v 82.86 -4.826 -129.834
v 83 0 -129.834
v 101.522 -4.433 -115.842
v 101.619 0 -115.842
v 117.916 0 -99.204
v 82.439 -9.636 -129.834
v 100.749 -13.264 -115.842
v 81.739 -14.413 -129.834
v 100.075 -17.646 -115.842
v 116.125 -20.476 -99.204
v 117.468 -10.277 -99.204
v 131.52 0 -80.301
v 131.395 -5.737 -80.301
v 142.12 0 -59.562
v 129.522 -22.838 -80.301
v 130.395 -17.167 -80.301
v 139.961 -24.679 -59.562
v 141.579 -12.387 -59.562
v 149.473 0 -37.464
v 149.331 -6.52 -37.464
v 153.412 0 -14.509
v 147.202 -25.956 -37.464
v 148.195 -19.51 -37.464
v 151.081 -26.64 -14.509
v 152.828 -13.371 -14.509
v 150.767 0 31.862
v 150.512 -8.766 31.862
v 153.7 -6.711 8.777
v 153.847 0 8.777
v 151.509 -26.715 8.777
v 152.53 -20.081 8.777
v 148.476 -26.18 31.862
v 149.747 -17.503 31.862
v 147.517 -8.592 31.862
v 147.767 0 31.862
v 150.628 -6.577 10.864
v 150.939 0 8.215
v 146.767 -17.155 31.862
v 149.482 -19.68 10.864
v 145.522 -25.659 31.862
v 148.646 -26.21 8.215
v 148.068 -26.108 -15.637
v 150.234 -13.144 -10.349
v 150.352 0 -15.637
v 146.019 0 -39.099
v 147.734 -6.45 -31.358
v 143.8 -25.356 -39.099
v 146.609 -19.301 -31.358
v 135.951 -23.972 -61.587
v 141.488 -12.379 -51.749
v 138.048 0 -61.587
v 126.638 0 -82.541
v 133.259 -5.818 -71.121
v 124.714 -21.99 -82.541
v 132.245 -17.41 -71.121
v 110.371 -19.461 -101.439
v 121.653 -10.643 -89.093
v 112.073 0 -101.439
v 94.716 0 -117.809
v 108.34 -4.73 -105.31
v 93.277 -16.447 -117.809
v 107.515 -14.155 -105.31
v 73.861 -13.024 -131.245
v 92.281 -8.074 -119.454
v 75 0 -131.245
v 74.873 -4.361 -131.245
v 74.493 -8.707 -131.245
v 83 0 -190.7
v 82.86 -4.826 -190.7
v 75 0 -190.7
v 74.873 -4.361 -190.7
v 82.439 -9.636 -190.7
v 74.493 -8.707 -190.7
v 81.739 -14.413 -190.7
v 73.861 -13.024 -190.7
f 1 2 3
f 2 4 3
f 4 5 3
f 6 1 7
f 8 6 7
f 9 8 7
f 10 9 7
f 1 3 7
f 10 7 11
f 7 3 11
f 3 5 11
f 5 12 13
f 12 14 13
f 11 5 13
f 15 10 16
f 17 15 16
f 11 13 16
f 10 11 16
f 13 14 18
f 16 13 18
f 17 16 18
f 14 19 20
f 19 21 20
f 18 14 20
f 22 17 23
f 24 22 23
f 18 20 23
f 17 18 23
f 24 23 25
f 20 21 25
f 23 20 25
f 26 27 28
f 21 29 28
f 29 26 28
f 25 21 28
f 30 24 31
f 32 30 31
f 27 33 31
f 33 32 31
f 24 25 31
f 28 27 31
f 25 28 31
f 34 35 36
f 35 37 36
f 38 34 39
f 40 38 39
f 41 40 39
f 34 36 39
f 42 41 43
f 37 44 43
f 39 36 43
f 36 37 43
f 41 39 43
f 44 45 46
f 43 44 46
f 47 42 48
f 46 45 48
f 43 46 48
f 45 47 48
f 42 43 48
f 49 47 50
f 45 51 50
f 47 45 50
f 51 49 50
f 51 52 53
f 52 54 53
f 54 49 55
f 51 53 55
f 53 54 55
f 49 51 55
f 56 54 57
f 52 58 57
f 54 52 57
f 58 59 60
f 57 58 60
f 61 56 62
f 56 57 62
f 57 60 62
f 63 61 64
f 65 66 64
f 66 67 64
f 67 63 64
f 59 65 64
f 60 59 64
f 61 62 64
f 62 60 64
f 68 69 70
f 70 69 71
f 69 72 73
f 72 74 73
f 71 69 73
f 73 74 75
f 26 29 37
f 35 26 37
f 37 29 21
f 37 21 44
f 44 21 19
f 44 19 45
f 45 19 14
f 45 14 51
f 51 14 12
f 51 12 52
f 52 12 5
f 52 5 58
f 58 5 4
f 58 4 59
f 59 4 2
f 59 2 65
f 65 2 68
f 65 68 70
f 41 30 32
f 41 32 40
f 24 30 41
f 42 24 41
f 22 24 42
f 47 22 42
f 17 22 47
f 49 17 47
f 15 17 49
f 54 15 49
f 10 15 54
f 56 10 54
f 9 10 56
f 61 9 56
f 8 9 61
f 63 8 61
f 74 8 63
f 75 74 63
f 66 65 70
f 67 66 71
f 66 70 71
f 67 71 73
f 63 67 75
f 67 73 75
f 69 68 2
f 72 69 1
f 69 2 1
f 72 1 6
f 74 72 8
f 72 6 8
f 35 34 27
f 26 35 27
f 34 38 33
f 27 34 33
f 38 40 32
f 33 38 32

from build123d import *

# Parameters (mm, degrees)
REVOLVE1_ANGLE = 10


with BuildPart() as part:
    # Sketch1 → Revolve1 (revolve)
    with BuildSketch(Plane(origin=(0, 0, 0), x_dir=(1, 0, 0), z_dir=(0, 1, 0))):
        with BuildLine():
            Line((75, 190.7), (83, 190.7))
            Line((83, 190.7), (83, 129.833691726))
            ThreePointArc((83, 129.833691726), (142.120054058, 59.562385293), (150.766644537, -31.862303784))
            Line((150.766644537, -31.862303784), (147.766644537, -31.862303784))
            ThreePointArc((147.766644537, -31.862303784), (138.047901954, 61.587047389), (75, 131.244762334))
            Line((75, 131.244762334), (75, 190.7))
        make_face()
    revolve(axis=Axis((0, 0, 125), (0, 0, -1)), revolution_arc=REVOLVE1_ANGLE)


solid = part.part
